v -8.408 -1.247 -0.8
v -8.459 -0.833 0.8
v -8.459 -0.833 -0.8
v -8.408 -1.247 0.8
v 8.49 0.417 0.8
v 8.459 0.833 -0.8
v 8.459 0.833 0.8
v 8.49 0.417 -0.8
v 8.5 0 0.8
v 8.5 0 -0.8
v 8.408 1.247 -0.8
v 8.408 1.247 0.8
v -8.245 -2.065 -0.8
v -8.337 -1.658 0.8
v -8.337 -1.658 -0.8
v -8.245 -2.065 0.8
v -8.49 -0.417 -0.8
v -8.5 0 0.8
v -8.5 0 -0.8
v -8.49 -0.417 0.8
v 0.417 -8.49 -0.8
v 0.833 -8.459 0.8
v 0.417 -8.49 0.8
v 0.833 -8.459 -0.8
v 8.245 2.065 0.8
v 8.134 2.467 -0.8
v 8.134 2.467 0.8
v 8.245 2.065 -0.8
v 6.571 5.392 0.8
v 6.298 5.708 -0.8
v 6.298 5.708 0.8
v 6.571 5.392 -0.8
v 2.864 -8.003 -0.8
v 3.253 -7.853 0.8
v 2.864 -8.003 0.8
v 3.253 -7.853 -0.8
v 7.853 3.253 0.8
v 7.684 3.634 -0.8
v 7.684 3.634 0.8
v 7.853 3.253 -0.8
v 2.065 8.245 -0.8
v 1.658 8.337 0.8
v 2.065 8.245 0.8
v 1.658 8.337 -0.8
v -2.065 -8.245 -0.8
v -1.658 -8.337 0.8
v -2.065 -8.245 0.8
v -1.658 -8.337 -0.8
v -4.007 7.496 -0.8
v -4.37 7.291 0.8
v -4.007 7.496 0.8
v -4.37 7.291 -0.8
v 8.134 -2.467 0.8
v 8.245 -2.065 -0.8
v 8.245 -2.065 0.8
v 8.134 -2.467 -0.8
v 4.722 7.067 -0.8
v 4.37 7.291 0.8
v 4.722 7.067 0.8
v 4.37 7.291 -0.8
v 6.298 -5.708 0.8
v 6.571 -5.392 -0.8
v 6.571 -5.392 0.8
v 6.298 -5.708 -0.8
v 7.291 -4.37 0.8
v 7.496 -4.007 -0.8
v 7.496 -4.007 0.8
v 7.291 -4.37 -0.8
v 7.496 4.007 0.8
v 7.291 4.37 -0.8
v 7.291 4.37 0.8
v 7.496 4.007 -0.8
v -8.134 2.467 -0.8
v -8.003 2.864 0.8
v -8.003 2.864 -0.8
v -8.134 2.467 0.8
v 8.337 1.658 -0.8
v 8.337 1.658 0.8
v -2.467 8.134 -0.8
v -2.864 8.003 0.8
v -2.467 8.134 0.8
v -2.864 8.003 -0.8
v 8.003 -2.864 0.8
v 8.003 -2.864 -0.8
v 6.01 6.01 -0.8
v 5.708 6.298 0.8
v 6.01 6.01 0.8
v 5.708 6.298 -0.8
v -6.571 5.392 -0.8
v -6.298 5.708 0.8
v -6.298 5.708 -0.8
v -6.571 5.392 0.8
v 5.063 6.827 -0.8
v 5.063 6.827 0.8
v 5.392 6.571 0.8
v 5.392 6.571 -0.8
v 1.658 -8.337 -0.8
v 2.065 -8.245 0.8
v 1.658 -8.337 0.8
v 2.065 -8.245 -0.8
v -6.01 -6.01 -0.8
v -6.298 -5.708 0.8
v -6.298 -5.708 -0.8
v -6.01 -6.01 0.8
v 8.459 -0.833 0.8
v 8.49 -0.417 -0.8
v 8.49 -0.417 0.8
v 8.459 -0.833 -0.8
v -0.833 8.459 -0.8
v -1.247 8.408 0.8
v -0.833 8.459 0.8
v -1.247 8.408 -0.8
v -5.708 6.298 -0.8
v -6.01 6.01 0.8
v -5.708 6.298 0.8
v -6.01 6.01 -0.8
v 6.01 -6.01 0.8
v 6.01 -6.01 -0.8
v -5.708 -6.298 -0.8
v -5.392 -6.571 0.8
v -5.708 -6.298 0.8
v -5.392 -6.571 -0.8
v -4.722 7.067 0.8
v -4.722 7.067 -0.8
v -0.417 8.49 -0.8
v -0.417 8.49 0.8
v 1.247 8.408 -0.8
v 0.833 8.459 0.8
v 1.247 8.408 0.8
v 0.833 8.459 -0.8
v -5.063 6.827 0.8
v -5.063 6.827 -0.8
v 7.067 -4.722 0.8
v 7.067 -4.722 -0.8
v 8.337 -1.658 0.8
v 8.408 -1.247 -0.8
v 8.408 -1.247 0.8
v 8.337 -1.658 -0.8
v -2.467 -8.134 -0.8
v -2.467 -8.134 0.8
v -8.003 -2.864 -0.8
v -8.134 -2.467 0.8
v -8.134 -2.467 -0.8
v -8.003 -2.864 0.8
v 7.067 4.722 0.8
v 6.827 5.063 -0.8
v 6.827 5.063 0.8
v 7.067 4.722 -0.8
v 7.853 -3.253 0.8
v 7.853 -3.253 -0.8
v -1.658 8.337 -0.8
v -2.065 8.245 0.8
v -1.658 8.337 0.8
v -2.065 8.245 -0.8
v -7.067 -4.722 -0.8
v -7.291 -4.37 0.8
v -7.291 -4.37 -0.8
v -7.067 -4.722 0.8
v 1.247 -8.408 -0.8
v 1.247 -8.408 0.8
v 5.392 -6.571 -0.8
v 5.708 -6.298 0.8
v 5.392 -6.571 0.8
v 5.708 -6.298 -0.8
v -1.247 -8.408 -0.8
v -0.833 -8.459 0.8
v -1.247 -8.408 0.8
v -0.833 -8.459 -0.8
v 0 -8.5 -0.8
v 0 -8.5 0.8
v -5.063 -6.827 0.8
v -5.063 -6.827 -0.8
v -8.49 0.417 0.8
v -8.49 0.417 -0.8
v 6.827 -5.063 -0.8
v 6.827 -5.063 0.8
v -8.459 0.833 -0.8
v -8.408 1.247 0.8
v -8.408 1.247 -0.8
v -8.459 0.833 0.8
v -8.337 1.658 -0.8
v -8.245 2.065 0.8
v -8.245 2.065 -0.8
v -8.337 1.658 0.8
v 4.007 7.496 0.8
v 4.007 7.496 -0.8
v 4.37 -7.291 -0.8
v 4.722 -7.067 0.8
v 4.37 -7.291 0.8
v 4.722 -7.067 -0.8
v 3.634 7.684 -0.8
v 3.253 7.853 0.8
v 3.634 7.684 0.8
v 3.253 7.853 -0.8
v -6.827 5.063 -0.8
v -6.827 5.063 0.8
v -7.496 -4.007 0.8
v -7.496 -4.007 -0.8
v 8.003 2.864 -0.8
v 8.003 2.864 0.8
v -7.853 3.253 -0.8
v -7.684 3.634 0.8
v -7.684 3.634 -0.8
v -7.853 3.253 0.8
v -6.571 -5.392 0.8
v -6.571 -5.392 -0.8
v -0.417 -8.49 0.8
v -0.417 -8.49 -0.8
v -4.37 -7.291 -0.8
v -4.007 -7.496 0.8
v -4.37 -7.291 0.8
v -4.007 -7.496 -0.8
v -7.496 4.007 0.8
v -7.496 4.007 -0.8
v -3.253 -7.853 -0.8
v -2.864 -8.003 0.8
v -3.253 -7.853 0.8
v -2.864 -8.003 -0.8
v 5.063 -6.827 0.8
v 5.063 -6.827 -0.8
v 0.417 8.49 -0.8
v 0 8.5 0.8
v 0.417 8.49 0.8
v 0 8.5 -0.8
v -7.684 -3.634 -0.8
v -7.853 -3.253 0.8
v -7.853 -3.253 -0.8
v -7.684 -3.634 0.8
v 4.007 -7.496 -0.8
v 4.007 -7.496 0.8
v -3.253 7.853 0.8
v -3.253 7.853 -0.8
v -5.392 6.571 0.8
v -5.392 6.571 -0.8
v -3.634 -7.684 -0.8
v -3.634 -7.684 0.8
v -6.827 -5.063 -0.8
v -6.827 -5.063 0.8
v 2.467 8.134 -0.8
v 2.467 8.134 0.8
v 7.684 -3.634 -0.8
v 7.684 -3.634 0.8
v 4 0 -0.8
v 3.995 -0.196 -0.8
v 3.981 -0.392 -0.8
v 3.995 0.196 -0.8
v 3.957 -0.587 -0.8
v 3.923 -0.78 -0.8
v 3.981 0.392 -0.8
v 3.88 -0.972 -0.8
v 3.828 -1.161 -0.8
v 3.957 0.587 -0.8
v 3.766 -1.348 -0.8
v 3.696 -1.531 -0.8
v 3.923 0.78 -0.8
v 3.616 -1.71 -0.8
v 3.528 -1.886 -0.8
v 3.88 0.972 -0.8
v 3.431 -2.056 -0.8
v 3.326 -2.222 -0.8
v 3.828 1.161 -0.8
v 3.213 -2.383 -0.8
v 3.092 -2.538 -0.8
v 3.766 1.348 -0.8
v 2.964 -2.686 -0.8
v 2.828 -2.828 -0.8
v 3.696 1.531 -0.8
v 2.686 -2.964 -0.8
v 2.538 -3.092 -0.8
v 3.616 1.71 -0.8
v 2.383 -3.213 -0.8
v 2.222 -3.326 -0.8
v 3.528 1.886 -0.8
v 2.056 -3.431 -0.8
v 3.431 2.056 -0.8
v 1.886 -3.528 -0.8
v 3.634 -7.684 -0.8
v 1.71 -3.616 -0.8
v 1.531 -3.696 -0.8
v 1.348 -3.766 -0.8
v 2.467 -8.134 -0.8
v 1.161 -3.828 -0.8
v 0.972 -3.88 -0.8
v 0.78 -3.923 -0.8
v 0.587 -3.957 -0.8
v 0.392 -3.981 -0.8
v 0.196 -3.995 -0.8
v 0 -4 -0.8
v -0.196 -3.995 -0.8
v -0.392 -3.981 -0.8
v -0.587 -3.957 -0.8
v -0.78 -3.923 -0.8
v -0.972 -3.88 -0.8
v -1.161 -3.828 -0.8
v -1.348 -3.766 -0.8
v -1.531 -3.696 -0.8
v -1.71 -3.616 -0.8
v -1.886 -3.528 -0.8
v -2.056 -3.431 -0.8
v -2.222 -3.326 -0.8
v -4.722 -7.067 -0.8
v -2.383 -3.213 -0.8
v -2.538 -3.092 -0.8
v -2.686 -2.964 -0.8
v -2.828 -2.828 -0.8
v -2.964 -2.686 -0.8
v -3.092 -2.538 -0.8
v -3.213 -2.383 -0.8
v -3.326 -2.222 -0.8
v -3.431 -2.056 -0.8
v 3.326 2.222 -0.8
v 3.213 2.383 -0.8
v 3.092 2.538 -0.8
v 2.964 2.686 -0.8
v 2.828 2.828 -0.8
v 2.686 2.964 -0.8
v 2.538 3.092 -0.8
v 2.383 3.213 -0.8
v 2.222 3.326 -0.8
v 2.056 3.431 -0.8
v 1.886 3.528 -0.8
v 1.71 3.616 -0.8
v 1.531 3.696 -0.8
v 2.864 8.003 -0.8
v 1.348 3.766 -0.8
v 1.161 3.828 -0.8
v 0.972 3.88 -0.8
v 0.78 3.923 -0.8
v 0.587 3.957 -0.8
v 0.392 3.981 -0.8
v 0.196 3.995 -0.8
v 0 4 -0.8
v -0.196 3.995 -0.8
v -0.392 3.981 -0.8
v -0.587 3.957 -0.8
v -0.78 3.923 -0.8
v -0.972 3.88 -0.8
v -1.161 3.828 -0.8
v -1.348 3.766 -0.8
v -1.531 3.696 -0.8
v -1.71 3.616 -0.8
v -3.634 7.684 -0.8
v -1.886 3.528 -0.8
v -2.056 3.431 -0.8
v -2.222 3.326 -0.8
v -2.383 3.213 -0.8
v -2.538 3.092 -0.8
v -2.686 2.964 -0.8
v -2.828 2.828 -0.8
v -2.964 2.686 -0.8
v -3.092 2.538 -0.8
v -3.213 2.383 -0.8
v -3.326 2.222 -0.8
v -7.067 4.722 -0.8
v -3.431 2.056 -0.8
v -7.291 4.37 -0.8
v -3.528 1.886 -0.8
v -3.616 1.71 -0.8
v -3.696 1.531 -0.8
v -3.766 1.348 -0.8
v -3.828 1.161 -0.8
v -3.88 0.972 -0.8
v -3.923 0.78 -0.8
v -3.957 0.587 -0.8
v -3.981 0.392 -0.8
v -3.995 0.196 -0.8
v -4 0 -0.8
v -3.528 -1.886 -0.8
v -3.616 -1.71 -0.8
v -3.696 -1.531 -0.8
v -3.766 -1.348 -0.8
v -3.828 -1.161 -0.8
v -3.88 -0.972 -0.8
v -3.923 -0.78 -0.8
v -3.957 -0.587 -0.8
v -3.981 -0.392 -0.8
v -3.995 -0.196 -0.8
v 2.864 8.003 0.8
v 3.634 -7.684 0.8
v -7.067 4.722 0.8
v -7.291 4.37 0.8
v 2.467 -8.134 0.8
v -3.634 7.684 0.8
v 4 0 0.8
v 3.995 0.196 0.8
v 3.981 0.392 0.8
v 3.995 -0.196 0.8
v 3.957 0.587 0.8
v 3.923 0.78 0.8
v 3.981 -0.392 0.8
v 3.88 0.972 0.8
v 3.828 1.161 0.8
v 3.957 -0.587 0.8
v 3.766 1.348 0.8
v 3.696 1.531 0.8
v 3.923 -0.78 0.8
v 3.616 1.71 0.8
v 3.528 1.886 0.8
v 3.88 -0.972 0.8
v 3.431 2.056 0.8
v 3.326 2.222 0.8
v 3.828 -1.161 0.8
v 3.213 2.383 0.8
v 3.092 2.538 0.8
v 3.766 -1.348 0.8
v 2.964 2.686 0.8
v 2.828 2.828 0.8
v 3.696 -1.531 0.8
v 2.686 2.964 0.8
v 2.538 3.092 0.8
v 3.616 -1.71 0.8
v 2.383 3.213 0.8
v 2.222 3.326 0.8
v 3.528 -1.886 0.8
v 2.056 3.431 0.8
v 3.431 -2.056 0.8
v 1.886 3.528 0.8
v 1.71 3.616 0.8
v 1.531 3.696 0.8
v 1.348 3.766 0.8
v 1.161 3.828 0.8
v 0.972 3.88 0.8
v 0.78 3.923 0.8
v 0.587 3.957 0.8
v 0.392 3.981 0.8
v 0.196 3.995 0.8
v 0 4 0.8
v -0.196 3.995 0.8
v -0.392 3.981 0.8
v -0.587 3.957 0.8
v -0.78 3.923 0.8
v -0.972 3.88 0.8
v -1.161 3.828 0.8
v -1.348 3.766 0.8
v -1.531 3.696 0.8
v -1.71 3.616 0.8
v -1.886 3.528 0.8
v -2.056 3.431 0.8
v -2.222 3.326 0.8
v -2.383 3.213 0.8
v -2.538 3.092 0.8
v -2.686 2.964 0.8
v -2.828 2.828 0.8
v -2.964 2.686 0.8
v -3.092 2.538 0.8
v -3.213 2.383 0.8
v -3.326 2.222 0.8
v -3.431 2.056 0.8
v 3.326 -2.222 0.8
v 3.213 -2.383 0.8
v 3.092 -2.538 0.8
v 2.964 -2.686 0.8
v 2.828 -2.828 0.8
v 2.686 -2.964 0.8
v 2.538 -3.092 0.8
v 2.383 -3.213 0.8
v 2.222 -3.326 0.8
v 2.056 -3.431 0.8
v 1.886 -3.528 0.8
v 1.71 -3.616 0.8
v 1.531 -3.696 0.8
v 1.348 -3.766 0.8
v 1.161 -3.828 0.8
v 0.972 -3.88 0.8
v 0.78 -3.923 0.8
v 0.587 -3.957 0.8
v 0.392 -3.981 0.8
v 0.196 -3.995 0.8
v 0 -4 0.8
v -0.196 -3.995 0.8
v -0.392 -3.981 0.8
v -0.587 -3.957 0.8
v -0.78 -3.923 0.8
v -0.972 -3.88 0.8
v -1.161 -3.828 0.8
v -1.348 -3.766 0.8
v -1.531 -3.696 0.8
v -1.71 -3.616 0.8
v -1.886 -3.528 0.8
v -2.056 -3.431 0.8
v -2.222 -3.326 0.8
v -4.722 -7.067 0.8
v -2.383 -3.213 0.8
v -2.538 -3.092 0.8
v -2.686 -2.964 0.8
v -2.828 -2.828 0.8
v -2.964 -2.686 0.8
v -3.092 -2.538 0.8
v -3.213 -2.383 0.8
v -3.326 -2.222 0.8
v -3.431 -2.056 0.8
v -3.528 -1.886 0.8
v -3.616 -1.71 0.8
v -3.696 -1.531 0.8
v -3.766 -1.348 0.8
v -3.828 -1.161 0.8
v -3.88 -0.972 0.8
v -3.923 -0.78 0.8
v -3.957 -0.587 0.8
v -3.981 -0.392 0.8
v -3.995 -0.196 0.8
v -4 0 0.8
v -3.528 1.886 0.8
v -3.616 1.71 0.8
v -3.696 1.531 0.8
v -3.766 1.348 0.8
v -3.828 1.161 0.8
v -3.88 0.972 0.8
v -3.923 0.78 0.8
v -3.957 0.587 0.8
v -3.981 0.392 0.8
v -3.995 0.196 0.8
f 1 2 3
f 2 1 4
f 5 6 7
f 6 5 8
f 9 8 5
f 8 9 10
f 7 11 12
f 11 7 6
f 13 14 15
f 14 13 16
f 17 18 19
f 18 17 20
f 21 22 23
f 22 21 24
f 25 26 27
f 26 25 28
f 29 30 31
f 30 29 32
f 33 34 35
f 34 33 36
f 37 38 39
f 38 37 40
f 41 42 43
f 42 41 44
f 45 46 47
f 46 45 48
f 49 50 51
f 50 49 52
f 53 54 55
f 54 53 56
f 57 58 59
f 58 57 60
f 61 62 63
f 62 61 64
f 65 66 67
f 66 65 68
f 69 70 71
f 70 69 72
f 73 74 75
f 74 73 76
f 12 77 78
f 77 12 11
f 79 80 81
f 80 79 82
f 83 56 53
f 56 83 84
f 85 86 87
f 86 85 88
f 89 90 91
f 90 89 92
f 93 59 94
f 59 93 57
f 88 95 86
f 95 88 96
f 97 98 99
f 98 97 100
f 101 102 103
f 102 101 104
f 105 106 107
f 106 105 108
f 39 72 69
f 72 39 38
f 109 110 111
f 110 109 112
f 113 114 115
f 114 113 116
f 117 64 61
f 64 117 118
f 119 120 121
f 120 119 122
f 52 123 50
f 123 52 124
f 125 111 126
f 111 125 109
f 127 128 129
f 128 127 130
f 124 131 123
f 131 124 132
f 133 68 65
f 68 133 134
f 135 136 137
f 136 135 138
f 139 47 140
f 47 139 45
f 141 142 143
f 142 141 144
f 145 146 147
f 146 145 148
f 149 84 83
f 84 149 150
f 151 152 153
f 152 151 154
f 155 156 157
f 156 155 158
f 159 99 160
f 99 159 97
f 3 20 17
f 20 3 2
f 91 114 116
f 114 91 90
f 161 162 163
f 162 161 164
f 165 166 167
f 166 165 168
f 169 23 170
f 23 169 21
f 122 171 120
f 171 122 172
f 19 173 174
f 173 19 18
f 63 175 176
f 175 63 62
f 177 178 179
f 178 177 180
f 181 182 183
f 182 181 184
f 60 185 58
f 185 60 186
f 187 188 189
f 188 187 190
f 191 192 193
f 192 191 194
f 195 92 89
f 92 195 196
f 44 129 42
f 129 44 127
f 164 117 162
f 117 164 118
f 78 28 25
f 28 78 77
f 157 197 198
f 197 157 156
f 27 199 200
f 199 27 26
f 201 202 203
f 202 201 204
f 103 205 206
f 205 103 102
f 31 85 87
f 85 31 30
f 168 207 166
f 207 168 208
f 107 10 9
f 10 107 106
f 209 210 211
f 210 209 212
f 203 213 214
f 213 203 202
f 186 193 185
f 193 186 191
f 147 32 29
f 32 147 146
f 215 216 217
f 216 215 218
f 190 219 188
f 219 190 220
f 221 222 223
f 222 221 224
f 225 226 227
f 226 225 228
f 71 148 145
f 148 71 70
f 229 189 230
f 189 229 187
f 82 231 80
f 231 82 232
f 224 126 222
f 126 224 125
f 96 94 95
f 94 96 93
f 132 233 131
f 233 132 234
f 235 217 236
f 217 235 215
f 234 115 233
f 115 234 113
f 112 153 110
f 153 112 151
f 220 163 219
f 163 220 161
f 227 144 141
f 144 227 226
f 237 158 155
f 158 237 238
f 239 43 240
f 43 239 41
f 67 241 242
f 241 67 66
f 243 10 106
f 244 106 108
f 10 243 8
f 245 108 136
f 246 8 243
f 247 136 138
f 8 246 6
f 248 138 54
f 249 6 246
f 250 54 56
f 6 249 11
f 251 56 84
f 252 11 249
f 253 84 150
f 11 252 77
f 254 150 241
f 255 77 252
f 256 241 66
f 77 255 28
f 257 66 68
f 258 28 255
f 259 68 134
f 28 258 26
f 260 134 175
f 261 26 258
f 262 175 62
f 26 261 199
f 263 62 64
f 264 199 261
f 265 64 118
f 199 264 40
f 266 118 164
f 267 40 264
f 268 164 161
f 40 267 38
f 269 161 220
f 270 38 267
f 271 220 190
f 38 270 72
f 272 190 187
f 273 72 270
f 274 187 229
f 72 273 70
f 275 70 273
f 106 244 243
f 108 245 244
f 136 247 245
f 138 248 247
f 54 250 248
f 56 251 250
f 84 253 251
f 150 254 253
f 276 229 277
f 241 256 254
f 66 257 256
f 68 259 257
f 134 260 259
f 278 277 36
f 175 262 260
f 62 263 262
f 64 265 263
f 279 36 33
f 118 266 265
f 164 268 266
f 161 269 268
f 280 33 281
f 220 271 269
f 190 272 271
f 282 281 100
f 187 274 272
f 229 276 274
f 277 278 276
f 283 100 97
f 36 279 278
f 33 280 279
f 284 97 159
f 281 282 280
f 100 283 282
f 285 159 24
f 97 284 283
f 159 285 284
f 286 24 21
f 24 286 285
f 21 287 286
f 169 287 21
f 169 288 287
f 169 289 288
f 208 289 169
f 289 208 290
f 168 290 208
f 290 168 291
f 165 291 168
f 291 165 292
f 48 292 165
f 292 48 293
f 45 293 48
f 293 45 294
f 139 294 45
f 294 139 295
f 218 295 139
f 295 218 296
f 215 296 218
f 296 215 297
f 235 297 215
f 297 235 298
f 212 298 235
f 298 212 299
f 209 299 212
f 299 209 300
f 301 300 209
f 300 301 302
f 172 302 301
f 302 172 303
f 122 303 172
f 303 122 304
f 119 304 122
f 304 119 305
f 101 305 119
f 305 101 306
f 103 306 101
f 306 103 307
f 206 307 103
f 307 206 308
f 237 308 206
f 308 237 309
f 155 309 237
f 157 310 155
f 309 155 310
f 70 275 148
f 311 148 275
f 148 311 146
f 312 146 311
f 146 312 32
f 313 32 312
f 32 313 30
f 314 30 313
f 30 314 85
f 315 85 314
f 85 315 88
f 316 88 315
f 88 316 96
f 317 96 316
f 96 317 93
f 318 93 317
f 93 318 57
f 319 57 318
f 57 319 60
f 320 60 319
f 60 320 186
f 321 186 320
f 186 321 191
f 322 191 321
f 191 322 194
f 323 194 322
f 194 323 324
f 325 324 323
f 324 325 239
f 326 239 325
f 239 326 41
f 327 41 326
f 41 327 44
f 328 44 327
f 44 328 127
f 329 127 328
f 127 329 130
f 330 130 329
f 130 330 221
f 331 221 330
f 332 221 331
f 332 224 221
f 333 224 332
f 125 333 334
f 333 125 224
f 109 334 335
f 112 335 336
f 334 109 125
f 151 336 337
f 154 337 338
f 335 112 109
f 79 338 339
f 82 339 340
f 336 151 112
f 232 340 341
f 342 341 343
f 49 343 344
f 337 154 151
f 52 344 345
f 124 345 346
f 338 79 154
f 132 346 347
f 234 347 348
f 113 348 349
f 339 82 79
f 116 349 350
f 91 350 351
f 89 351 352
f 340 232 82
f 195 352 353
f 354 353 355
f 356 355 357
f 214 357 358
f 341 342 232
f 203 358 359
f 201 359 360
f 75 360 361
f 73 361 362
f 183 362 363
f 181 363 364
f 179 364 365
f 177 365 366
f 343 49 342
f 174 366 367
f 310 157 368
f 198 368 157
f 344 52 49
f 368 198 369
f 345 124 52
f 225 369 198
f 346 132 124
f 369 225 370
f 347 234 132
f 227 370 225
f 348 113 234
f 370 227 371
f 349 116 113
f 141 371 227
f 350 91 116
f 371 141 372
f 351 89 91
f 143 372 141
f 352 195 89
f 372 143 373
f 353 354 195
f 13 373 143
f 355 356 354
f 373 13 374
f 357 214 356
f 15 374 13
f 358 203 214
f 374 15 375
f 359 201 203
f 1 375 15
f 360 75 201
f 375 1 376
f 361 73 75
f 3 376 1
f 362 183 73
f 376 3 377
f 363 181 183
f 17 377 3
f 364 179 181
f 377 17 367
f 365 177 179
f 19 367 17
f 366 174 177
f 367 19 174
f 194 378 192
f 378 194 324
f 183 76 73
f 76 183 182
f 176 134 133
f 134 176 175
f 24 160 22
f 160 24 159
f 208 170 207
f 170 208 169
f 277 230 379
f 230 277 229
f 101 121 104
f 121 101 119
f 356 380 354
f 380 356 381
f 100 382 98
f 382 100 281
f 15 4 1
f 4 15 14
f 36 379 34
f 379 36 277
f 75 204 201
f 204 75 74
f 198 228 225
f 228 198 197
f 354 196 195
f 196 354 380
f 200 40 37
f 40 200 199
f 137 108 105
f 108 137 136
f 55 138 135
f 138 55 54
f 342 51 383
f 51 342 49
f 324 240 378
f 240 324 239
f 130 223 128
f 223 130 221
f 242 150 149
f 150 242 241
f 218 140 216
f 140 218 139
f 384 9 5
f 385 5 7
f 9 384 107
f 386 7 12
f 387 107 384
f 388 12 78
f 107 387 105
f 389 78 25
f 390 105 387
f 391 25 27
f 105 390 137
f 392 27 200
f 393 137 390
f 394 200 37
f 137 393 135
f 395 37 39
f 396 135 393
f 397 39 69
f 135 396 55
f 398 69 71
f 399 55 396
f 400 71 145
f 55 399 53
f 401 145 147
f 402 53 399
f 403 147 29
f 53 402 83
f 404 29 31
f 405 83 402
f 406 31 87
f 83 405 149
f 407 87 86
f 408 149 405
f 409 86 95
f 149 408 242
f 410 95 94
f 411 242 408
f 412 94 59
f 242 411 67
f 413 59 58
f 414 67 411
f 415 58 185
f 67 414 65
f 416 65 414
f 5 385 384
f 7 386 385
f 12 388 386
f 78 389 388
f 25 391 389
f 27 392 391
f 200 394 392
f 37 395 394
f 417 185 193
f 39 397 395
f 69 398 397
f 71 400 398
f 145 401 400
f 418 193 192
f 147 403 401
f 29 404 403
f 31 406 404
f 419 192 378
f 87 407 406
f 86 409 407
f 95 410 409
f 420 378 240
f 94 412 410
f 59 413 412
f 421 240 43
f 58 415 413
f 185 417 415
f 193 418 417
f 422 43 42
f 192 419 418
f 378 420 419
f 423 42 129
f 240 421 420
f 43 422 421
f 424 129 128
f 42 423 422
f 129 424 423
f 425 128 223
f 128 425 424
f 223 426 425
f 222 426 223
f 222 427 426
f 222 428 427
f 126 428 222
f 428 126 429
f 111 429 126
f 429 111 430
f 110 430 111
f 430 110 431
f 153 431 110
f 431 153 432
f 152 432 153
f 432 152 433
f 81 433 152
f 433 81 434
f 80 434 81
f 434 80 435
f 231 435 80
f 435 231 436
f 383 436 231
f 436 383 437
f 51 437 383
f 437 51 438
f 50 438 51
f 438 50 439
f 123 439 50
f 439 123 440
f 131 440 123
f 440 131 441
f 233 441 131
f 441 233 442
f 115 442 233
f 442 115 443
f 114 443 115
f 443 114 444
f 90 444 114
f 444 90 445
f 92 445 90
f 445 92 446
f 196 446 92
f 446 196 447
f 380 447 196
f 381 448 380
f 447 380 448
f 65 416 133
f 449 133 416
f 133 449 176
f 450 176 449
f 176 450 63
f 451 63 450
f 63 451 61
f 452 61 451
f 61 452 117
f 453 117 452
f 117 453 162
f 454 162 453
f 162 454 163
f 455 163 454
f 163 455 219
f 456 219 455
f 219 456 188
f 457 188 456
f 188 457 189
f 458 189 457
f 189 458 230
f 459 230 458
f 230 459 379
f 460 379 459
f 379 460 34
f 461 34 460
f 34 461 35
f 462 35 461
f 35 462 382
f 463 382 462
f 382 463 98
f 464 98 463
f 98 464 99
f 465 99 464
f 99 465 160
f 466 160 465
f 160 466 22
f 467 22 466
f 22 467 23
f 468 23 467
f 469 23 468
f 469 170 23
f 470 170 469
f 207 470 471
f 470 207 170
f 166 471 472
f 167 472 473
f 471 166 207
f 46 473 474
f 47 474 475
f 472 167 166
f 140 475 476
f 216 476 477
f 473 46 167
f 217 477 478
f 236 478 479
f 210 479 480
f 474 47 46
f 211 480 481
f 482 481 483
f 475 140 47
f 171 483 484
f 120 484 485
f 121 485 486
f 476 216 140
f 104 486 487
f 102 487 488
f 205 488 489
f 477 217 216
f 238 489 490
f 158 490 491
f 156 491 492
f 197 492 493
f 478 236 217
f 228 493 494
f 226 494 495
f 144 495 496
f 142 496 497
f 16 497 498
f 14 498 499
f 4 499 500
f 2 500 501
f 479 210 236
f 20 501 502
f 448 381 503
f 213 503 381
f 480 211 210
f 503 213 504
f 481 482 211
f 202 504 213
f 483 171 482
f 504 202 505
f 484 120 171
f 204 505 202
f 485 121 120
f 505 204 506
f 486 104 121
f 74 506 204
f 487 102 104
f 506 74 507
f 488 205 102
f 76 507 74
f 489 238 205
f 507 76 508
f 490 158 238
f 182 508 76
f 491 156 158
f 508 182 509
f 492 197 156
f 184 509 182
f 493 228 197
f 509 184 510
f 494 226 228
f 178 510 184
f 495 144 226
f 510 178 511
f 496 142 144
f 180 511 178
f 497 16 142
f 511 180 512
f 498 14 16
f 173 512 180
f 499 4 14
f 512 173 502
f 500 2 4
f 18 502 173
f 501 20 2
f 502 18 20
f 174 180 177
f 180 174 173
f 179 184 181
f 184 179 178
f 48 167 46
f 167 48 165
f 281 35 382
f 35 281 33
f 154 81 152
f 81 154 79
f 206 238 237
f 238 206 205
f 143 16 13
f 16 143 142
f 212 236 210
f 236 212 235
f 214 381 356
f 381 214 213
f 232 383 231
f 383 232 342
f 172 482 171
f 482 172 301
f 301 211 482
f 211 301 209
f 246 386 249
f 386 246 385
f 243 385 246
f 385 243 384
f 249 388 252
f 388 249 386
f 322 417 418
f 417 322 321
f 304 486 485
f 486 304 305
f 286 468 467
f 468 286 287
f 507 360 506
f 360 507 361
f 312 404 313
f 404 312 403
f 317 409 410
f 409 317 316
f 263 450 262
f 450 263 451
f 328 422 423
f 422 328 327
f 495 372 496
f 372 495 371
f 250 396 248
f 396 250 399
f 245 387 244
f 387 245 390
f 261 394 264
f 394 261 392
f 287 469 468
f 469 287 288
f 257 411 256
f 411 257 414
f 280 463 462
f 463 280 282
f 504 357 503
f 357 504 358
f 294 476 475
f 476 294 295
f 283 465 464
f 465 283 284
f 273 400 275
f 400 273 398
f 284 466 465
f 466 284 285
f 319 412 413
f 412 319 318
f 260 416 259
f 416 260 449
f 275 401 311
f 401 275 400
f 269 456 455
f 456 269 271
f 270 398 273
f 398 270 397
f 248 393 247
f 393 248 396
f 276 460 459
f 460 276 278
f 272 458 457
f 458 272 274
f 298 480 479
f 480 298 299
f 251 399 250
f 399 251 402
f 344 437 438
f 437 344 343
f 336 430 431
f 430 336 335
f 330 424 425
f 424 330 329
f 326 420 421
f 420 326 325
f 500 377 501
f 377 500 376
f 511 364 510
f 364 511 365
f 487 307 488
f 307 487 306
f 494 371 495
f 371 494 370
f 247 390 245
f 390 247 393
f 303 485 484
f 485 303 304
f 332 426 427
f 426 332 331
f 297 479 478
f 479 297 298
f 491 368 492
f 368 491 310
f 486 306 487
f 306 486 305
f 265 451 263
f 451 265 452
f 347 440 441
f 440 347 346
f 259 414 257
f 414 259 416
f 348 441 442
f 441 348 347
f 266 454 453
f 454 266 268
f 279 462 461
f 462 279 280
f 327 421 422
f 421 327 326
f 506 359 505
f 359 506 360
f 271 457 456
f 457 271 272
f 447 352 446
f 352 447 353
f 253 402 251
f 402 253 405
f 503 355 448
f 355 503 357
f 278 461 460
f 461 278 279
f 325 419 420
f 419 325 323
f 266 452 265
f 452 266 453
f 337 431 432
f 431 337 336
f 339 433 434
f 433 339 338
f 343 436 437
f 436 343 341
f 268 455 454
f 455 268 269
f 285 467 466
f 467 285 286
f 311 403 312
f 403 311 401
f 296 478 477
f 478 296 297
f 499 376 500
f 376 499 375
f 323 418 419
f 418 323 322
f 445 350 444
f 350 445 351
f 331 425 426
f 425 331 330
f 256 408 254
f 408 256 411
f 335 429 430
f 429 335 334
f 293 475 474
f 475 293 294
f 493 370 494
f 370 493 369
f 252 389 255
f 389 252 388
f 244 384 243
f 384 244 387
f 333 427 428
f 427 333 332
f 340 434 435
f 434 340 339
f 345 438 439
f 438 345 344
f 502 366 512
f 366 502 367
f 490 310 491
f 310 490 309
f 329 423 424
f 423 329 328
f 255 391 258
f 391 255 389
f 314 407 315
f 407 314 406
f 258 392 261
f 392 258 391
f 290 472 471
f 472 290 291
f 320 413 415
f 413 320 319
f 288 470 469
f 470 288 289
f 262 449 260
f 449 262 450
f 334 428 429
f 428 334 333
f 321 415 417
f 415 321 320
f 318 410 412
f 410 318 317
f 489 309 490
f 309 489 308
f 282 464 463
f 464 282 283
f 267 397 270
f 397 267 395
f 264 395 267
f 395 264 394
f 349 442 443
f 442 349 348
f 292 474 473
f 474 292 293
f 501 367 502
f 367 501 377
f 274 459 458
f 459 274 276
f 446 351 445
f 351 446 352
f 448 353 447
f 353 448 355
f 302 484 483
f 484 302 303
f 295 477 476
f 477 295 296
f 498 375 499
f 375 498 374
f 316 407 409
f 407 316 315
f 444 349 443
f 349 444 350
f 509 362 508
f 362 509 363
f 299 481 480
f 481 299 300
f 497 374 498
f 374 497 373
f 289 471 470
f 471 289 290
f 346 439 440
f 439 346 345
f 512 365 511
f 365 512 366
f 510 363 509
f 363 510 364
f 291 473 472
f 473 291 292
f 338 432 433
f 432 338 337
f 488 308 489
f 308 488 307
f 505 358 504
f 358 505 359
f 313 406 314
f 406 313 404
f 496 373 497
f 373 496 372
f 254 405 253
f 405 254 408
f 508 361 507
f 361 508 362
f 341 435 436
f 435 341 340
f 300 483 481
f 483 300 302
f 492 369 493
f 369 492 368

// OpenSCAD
$fn = 128;

inner_d = 8.0;
outer_d = 17.0;
thickness = 1.6;

eps = 0.02;

difference() {
    cylinder(h = thickness, d = outer_d, center = true);
    cylinder(h = thickness + 2*eps, d = inner_d, center = true);
}
